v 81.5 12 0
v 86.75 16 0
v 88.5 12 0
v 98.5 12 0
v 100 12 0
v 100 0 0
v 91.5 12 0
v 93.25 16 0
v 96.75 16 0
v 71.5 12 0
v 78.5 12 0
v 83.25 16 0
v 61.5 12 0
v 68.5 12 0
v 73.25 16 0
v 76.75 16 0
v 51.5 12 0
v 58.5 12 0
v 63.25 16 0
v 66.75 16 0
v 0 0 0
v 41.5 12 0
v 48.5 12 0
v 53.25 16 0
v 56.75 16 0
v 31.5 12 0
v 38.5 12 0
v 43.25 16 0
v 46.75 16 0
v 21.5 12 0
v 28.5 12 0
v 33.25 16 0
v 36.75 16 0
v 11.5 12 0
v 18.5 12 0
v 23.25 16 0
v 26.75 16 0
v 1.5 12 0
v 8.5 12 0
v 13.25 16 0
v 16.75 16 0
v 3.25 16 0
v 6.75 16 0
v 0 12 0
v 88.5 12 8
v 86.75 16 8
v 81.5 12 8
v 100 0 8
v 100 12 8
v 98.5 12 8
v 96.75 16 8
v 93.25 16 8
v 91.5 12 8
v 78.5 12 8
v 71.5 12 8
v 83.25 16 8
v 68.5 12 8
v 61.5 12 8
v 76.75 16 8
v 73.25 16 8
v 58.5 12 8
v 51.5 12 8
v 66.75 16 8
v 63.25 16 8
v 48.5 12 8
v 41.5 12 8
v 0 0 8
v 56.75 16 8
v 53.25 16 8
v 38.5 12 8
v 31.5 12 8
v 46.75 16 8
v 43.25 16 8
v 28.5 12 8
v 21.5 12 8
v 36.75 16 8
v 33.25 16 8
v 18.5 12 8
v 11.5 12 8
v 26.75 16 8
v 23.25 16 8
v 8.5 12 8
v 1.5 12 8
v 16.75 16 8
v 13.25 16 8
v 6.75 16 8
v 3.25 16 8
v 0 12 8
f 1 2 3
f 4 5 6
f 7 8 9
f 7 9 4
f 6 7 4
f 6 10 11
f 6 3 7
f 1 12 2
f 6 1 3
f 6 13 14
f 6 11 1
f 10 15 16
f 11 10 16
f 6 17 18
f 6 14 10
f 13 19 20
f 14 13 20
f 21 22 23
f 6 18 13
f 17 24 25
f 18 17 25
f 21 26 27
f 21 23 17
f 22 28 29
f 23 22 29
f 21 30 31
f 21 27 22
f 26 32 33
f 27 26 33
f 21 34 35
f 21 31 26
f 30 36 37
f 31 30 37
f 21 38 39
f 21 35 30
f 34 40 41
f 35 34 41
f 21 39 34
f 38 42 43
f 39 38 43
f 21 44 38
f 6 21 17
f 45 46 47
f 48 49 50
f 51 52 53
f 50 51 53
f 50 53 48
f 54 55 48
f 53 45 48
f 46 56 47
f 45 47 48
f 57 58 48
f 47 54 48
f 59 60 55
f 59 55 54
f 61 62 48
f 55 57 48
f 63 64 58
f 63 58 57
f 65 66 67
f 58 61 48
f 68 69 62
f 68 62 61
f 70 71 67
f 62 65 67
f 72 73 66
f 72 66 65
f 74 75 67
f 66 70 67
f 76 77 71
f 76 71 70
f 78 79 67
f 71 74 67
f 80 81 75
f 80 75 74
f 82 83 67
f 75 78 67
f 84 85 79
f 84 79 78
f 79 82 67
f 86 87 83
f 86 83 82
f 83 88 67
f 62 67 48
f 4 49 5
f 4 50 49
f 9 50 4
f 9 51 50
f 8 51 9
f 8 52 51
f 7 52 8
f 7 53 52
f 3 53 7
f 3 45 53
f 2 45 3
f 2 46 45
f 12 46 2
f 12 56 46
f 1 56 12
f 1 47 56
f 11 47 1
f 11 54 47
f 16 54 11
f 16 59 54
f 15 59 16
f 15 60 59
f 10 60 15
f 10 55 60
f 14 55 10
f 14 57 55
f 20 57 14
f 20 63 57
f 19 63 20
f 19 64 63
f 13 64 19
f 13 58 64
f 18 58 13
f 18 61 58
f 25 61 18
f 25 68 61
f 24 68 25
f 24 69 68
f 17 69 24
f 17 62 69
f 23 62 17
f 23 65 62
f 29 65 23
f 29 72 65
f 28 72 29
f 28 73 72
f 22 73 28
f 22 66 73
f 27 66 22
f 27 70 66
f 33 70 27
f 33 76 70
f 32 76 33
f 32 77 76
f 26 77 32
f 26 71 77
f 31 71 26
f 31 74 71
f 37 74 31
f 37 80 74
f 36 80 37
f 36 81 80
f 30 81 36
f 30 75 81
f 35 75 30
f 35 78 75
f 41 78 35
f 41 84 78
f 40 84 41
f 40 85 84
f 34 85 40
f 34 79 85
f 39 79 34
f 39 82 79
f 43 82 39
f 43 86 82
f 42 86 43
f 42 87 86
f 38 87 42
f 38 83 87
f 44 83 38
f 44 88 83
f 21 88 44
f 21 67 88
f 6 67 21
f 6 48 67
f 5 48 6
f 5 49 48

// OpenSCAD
$fn = 32;

// ----------------------------------------------------------------------
// Gear rack: 10 teeth, pitch 10 mm
// ----------------------------------------------------------------------

// --- parameters (mm) ---
teeth = 10;               // number of teeth
pitch = 10;               // tooth pitch, X
root_w = 7;               // tooth width at the root
tip_w = 3.5;              // tooth width at the tip
base_h = 12;              // rack body height, Y
tooth_h = 4;              // tooth height above the body
plate_t = 8;              // rack width, Z (extrusion height)

rack_l = teeth * pitch;  // overall length
total_h = base_h + tooth_h;  // overall height

profile = [[0, 0], [100, 0], [100, 12], [98.5, 12], [96.75, 16], [93.25, 16], [91.5, 12], [88.5, 12], [86.75, 16], [83.25, 16], [81.5, 12], [78.5, 12], [76.75, 16], [73.25, 16], [71.5, 12], [68.5, 12], [66.75, 16], [63.25, 16], [61.5, 12], [58.5, 12], [56.75, 16], [53.25, 16], [51.5, 12], [48.5, 12], [46.75, 16], [43.25, 16], [41.5, 12], [38.5, 12], [36.75, 16], [33.25, 16], [31.5, 12], [28.5, 12], [26.75, 16], [23.25, 16], [21.5, 12], [18.5, 12], [16.75, 16], [13.25, 16], [11.5, 12], [8.5, 12], [6.75, 16], [3.25, 16], [1.5, 12], [0, 12]];  // primary outline, 44 points, counter clockwise

// --- the one profile operation ---
linear_extrude(height = plate_t) polygon(points = profile);
